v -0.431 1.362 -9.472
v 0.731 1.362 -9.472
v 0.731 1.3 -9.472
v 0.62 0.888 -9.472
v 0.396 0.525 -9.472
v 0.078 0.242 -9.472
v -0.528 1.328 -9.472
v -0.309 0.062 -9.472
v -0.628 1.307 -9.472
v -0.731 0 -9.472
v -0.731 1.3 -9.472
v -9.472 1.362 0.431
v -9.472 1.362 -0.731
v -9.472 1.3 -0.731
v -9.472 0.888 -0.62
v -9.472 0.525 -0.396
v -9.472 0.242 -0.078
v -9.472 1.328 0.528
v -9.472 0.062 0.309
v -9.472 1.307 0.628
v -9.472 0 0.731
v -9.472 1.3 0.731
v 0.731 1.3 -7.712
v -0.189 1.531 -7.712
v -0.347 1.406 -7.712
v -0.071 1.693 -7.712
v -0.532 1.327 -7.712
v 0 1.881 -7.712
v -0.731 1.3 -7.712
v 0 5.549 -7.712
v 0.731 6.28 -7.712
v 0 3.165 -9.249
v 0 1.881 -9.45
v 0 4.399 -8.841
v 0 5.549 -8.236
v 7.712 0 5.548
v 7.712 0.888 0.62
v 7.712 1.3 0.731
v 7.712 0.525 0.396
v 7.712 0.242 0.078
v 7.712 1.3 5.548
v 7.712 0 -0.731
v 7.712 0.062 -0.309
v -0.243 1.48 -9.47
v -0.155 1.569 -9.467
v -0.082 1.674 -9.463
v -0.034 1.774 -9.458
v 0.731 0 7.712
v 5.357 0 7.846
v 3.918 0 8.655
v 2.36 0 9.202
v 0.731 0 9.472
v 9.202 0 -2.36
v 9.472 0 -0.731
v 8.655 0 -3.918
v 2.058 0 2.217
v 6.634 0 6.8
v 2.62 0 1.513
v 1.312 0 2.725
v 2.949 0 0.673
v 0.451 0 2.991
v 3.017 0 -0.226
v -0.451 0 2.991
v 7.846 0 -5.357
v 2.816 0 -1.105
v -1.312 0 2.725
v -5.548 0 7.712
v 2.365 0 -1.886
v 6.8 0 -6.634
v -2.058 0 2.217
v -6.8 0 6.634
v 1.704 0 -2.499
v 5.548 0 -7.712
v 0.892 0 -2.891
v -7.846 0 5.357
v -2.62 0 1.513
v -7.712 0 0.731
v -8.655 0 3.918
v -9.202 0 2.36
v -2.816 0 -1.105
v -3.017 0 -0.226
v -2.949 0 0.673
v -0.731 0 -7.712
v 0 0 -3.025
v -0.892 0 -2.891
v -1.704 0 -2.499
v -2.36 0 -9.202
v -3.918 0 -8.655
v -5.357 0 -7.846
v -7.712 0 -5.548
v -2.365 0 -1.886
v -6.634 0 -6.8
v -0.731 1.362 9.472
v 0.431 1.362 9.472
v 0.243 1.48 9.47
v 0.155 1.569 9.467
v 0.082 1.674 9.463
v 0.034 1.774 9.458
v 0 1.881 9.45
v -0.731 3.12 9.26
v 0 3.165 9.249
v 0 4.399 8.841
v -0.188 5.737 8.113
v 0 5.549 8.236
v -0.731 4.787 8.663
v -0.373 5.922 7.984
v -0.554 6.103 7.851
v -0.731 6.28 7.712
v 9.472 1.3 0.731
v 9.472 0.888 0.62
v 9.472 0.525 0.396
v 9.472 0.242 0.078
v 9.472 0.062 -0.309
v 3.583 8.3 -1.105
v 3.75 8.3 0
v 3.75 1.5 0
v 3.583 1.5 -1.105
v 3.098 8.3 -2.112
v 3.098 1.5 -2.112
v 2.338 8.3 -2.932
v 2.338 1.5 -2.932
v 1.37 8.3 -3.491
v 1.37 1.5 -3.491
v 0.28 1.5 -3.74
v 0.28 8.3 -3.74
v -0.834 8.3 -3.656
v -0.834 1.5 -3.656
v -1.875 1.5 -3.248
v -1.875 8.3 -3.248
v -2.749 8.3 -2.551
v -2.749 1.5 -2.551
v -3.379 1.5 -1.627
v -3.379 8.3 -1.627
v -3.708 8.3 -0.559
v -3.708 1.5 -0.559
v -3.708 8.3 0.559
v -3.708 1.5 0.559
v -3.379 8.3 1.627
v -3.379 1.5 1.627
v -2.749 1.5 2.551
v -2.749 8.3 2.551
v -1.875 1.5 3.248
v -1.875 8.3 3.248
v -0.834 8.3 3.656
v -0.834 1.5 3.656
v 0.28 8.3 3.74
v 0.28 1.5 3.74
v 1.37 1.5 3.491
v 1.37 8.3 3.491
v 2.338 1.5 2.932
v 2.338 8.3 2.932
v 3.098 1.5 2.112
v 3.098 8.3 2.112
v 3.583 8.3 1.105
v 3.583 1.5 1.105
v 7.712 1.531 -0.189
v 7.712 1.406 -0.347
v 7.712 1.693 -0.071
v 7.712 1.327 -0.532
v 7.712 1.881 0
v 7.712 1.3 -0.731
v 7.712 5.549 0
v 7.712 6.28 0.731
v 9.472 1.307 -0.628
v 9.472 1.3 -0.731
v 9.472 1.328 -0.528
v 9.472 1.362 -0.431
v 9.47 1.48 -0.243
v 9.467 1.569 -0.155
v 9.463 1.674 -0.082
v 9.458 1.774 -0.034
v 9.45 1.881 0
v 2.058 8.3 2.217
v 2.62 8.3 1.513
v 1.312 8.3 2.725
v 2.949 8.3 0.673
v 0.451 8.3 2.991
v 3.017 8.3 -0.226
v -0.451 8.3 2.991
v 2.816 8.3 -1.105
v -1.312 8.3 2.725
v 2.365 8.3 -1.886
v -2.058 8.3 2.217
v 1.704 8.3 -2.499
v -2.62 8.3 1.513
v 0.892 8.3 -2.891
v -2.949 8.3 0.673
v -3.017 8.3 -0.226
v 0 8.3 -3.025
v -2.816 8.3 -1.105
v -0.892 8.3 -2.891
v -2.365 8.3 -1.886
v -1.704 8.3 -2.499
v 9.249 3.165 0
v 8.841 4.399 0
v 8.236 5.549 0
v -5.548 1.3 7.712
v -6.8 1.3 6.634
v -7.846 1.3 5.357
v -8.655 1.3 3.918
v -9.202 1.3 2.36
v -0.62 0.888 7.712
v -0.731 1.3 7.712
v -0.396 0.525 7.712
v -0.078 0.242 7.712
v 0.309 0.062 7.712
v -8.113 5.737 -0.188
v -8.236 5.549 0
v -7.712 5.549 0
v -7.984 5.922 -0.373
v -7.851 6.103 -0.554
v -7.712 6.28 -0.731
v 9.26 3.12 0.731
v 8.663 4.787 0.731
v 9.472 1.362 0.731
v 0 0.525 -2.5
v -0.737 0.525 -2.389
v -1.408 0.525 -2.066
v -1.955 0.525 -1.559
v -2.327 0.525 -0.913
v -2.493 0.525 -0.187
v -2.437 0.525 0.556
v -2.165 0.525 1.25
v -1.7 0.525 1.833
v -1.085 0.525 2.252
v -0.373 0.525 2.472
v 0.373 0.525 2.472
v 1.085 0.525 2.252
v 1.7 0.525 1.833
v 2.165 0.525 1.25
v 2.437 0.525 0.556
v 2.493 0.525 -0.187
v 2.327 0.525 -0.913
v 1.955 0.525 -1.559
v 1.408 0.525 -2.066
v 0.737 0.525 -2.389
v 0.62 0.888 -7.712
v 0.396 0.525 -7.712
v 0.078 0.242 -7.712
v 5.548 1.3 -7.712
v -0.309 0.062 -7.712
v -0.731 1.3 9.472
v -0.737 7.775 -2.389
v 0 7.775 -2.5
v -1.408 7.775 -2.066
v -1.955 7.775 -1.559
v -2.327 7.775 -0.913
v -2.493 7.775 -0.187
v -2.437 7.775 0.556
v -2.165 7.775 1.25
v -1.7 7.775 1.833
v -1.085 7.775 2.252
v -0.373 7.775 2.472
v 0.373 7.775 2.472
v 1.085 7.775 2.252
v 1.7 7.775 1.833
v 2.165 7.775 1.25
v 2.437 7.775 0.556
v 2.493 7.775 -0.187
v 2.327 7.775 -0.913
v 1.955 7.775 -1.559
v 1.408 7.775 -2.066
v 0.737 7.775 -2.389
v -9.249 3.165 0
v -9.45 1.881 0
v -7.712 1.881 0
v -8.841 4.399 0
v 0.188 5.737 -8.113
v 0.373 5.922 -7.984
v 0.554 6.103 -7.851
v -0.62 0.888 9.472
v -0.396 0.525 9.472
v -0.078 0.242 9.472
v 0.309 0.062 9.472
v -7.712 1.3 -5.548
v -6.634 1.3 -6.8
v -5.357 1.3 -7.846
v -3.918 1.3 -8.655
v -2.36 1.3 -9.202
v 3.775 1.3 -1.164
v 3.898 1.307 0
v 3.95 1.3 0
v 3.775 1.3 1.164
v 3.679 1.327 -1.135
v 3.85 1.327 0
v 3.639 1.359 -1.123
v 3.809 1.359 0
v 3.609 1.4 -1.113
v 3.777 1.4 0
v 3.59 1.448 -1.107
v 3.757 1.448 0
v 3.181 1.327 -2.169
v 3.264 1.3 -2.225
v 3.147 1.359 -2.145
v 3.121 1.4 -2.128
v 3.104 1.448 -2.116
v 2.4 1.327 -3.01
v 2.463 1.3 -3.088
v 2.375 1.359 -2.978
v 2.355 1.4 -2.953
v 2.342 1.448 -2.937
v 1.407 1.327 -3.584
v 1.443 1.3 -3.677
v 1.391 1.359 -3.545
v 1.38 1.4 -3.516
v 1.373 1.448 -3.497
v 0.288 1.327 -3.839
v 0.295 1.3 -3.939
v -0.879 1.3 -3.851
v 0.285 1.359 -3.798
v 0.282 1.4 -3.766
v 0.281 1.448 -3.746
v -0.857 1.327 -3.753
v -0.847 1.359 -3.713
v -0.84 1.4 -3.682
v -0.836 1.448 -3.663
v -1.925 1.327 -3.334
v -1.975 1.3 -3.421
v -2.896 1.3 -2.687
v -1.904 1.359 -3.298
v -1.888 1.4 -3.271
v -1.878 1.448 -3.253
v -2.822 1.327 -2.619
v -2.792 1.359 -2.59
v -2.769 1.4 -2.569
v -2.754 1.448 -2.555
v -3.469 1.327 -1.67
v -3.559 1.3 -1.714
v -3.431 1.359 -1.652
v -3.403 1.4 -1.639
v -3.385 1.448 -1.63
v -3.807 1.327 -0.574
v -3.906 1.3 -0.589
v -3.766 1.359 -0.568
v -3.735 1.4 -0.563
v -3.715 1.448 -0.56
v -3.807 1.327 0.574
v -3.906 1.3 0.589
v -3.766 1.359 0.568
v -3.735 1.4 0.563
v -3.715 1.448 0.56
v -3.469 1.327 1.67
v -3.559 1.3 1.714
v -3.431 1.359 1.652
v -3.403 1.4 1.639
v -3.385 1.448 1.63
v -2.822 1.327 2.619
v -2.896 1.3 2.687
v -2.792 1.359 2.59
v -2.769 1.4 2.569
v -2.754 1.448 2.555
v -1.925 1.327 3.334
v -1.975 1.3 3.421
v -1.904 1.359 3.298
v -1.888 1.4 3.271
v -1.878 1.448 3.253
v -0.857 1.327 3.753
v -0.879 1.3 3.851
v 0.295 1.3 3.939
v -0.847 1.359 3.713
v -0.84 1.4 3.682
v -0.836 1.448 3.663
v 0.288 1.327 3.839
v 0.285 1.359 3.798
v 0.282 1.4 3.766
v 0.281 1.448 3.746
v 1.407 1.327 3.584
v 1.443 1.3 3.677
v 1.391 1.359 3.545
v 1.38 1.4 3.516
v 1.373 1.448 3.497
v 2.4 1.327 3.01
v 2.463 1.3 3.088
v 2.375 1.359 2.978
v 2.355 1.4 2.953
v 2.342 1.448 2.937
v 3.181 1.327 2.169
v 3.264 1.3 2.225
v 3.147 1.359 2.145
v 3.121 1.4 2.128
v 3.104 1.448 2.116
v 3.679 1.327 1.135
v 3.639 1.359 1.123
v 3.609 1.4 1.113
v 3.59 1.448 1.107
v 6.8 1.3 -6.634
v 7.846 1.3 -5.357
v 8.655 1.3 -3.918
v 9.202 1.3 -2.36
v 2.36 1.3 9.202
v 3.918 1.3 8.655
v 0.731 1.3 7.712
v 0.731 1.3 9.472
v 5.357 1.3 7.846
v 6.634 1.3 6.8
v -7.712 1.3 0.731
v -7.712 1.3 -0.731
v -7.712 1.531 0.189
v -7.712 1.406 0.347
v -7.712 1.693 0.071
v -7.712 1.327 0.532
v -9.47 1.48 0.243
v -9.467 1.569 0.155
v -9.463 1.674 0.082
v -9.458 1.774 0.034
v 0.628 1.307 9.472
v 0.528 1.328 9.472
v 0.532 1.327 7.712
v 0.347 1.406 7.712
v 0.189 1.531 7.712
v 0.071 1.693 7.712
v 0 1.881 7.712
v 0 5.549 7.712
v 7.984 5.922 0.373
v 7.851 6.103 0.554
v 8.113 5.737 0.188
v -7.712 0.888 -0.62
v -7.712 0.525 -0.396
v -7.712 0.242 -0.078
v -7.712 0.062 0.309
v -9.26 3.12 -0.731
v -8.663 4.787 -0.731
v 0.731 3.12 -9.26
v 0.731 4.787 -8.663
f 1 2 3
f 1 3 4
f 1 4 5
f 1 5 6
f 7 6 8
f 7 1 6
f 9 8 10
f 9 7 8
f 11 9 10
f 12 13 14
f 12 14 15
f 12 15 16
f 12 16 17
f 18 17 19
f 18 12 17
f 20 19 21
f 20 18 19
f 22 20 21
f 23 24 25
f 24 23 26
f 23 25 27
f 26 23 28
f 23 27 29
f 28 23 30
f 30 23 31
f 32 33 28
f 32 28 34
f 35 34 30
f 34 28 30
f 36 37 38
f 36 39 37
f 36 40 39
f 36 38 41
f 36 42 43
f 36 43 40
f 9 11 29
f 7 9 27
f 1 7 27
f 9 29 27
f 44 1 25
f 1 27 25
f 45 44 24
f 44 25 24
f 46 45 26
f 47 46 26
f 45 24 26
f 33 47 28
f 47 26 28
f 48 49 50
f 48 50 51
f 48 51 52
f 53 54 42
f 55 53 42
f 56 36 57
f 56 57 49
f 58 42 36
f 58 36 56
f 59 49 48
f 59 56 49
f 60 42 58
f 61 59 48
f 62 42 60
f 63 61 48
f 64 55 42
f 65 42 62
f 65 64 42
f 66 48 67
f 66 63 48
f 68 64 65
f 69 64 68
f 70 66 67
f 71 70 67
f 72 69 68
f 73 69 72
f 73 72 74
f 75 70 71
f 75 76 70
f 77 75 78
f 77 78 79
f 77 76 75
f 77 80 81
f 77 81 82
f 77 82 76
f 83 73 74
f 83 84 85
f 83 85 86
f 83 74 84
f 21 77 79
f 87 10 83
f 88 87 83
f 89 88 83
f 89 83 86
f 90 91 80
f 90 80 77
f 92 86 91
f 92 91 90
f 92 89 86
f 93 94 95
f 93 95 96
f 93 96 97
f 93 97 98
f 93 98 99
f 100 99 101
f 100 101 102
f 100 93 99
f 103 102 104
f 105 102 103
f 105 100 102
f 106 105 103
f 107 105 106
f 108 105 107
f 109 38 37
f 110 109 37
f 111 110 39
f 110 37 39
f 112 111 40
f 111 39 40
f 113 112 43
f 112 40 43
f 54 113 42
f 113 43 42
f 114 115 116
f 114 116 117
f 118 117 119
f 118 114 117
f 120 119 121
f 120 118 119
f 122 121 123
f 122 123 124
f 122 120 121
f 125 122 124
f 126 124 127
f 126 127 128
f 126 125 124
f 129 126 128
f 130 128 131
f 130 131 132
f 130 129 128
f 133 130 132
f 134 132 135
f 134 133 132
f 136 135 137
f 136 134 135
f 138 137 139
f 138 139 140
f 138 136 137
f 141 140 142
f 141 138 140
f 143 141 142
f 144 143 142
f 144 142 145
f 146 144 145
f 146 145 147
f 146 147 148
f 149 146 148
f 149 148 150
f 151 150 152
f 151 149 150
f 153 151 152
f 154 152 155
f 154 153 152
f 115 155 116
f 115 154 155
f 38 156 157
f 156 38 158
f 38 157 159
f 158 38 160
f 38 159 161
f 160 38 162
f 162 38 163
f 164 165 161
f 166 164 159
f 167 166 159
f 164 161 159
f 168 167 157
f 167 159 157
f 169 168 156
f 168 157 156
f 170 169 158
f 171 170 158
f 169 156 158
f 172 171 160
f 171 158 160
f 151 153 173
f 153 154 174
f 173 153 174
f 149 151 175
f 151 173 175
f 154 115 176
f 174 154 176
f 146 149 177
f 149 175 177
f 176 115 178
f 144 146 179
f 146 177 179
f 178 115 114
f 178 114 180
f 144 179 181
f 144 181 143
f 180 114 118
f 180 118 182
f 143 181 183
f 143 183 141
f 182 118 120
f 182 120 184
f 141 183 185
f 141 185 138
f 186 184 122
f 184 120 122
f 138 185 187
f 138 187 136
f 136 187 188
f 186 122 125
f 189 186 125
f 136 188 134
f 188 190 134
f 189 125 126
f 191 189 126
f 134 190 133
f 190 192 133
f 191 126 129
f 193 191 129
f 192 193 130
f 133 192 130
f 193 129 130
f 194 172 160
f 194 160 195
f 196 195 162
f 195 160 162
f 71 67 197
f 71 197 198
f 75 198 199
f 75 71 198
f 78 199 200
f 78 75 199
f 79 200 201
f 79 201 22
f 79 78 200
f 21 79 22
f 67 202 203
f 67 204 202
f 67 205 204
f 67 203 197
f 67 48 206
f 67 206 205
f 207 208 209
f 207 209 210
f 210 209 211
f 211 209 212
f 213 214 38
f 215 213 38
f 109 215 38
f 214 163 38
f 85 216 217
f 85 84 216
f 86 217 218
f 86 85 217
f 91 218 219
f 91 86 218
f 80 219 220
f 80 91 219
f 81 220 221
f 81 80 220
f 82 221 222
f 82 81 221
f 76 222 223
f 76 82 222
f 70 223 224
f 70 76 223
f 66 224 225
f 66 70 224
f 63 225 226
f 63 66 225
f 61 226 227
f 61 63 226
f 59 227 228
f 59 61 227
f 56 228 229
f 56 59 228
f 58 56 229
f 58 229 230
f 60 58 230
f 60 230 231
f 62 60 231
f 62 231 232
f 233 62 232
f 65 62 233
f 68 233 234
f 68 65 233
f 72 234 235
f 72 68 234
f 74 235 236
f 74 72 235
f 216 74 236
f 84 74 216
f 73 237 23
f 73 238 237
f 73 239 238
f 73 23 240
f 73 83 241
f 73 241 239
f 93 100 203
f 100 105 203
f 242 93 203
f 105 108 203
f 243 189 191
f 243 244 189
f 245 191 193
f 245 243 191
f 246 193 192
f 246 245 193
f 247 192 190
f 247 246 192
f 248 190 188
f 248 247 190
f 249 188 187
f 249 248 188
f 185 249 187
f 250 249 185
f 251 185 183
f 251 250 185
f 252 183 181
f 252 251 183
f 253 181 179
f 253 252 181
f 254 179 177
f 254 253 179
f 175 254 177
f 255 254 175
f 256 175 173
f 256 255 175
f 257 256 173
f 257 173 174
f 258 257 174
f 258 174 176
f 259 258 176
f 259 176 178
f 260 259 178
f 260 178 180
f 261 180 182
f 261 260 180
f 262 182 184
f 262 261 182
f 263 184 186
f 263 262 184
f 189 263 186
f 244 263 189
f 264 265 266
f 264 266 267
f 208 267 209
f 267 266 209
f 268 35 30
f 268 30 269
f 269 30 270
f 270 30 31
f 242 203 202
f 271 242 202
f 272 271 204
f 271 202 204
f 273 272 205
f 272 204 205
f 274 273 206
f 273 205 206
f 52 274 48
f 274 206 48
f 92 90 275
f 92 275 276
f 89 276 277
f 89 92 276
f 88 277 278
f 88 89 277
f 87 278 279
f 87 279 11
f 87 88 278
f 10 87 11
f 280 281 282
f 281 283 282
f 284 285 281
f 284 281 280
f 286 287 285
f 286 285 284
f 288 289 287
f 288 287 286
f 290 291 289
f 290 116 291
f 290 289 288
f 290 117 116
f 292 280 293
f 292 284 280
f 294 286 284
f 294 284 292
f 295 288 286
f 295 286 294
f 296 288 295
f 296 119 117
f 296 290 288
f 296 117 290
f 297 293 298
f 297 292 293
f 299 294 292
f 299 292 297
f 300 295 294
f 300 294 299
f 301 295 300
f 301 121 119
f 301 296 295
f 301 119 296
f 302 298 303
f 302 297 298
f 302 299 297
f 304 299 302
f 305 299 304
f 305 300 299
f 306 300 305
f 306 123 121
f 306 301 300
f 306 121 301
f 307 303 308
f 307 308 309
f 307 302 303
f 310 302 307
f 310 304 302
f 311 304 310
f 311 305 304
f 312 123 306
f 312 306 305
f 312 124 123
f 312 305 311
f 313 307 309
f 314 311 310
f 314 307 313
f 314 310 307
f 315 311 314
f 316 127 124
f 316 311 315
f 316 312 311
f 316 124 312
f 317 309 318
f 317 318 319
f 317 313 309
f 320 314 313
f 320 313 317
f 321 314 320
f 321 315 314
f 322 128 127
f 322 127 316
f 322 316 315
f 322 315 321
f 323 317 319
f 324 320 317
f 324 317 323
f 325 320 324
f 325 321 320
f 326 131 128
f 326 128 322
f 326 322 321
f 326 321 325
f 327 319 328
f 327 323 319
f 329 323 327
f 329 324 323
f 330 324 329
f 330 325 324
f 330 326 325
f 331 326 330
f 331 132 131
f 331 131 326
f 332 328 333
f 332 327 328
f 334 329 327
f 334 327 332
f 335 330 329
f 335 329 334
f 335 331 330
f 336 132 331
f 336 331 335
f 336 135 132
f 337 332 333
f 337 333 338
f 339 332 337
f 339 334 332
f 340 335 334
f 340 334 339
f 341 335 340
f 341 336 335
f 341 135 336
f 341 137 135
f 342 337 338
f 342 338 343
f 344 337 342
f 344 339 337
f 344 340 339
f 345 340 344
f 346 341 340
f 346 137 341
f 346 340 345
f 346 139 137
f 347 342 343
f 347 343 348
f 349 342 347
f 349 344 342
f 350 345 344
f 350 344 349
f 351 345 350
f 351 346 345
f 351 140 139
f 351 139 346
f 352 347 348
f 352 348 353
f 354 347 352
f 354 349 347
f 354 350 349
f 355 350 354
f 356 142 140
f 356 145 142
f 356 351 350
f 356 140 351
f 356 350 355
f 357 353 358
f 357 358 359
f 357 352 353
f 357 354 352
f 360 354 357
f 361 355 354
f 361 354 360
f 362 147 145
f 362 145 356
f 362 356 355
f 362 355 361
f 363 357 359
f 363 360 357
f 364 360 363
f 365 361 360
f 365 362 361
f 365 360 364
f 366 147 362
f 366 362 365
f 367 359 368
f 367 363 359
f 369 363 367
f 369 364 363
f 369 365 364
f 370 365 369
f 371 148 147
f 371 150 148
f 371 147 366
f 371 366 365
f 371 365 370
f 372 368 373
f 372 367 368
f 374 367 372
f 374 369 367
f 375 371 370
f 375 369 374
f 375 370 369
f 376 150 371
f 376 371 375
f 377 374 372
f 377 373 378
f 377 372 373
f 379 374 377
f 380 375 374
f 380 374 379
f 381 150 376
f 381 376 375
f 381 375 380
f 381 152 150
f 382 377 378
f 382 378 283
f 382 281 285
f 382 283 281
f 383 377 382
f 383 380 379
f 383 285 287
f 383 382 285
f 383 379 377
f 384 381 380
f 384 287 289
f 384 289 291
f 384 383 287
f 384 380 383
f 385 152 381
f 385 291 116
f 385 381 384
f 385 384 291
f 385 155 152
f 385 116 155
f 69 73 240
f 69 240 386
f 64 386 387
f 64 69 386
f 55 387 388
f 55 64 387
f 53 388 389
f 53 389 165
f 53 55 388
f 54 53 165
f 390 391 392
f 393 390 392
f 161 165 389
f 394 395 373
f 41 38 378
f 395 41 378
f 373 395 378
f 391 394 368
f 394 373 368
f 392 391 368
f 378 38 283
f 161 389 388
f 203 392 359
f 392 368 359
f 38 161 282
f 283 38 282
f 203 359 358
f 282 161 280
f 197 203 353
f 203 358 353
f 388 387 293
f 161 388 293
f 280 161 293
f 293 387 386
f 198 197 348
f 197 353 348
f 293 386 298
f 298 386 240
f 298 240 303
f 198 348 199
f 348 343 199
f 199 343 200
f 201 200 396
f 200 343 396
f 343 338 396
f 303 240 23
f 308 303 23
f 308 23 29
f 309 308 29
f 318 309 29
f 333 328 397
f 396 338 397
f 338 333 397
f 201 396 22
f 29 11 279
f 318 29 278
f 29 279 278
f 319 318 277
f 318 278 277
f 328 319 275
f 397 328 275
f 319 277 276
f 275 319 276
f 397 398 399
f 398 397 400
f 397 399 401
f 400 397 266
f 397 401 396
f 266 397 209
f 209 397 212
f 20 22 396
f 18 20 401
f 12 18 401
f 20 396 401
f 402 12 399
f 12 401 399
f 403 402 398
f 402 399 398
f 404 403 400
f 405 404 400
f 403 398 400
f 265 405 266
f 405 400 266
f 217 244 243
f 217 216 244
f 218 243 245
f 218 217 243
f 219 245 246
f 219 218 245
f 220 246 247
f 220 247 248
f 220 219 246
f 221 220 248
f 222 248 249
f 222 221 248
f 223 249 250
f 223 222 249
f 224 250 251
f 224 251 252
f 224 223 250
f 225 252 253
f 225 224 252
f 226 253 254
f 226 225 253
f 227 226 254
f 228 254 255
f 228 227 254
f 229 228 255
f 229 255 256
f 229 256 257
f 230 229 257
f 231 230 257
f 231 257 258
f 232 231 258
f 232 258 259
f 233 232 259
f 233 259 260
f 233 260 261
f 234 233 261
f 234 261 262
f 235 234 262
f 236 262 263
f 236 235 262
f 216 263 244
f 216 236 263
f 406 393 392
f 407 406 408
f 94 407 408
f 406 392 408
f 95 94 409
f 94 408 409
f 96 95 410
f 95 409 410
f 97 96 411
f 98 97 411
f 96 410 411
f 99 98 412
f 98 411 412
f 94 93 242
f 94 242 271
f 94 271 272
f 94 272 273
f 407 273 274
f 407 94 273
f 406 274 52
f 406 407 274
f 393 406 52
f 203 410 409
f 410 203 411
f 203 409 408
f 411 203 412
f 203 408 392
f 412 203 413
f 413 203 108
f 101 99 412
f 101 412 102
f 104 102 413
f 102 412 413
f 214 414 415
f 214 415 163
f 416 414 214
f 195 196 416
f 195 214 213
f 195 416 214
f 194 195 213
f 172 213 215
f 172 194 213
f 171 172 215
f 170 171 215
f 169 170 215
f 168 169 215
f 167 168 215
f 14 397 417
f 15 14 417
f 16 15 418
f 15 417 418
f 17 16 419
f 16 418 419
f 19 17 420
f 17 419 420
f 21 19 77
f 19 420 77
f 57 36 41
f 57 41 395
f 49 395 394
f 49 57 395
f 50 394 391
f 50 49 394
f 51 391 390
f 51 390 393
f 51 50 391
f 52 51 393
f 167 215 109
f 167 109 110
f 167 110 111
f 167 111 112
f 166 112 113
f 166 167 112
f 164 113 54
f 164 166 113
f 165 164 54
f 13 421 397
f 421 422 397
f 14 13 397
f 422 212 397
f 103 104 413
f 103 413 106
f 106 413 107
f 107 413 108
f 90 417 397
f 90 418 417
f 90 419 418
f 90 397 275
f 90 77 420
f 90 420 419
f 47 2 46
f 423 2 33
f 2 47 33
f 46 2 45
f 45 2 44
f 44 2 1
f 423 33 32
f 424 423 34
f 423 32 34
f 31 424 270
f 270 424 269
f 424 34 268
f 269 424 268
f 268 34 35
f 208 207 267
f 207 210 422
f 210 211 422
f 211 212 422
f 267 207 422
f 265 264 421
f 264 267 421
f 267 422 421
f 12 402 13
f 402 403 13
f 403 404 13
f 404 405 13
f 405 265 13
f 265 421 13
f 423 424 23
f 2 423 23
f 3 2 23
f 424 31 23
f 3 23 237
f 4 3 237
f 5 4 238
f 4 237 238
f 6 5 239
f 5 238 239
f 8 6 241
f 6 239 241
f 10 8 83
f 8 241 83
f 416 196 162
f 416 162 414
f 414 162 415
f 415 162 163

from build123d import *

# Parameters (mm, degrees)
BOSS_EXTRUDE1_DEPTH     = 1.3
BOSS_EXTRUDE2_DEPTH     = 1.76
CIRPATTERN1_COUNT       = 4
CUT_EXTRUDE2_DEPTH      = 15.794267561
CUT_EXTRUDE2_DEPTH_BACK = 15.794267561
CUT_EXTRUDE3_DEPTH      = 15.794267603
CUT_EXTRUDE3_DEPTH_BACK = 15.794267603
SKETCH8_W               = 3.75
SKETCH8_H               = 7
FILLET1_R               = 0.2


with BuildPart() as part:
    # Sketch1 → Boss-Extrude1 (new body)
    with BuildSketch(Plane(origin=(0, 0, 0), x_dir=(1, 0, 0), z_dir=(0, 1, 0))):
        with BuildLine():
            Line((-0.730769231, 7.71160656), (5.548073923, 7.71160656))
            ThreePointArc((5.548073923, 7.71160656), (8.281459084, 4.65482926), (9.47185179, 0.730769231))
            Line((9.47185179, 0.730769231), (7.71160656, 0.730769231))
            Line((7.71160656, 0.730769231), (7.71160656, -5.548073923))
            ThreePointArc((7.71160656, -5.548073923), (4.65482926, -8.281459084), (0.730769231, -9.47185179))
            Line((0.730769231, -9.47185179), (0.730769231, -7.71160656))
            Line((0.730769231, -7.71160656), (-5.548073923, -7.71160656))
            ThreePointArc((-5.548073923, -7.71160656), (-8.281459084, -4.65482926), (-9.47185179, -0.730769231))
            Line((-9.47185179, -0.730769231), (-7.71160656, -0.730769231))
            Line((-7.71160656, -0.730769231), (-7.71160656, 5.548073923))
            ThreePointArc((-7.71160656, 5.548073923), (-4.65482926, 8.281459084), (-0.730769231, 9.47185179))
            Line((-0.730769231, 9.47185179), (-0.730769231, 7.71160656))
        make_face()
    extrude(amount=BOSS_EXTRUDE1_DEPTH)

    # Sketch2 → Boss-Extrude2 (add)
    with BuildSketch(Plane(origin=(0, 0, -7.71160656), x_dir=(-1, 0, 0), z_dir=(0, 0, -1))):
        with BuildLine():
            Line((-0.730769231, 6.28), (-0.730769231, 1.3))
            ThreePointArc((-0.730769231, 1.3), (-0.24725105, 0.372025447), (0.730769231, 0))
            Line((0.730769231, 0), (0.730769231, 1.3))
            ThreePointArc((0.730769231, 1.3), (0.26383811, 1.463095229), (0, 1.881442187))
            Line((0, 1.881442187), (0, 5.549230769))
            Line((0, 5.549230769), (-0.730769231, 6.28))
        make_face()
    boss_extrude2 = extrude(amount=BOSS_EXTRUDE2_DEPTH)

    # CirPattern1: Boss-Extrude2 ×4 about axis
    cirpattern1_axis = Axis((0, 0, 0), (0, 1, 0))
    for i in range(1, CIRPATTERN1_COUNT):
        add(boss_extrude2.rotate(cirpattern1_axis, i * 360 / CIRPATTERN1_COUNT))

    # Sketch6 → Cut-Extrude2 (cut, two sides: drawn at the far end of the back side and taken through both)
    with BuildSketch(Plane(origin=(0, 0, 0), x_dir=(0, 0, -1), z_dir=(1, 0, 0)).offset(-CUT_EXTRUDE2_DEPTH_BACK)):
        with BuildLine():
            Line((-7.71160656, 6.28), (-9.47160656, 6.28))
            Line((-9.47160656, 6.28), (-9.47185179, 1.3))
            ThreePointArc((-9.47185179, 1.3), (-9.018842539, 3.940968727), (-7.71160656, 6.28))
        make_face()
        with BuildLine():
            Line((7.71160656, 6.28), (9.47160656, 6.28))
            Line((9.47160656, 6.28), (9.47185179, 1.3))
            ThreePointArc((9.47185179, 1.3), (9.018842539, 3.940968727), (7.71160656, 6.28))
        make_face()
    extrude(amount=CUT_EXTRUDE2_DEPTH + CUT_EXTRUDE2_DEPTH_BACK, mode=Mode.SUBTRACT)

    # Sketch7 → Cut-Extrude3 (cut, two sides: drawn at the far end of the back side and taken through both)
    with BuildSketch(Plane.XY.offset(-CUT_EXTRUDE3_DEPTH_BACK)):
        with BuildLine():
            Line((-9.47160656, 6.28), (-7.71160656, 6.28))
            ThreePointArc((-7.71160656, 6.28), (-9.018842539, 3.940968727), (-9.47185179, 1.3))
            Line((-9.47185179, 1.3), (-9.47160656, 6.28))
        make_face()
        with BuildLine():
            Line((9.47160656, 6.28), (7.71160656, 6.28))
            ThreePointArc((7.71160656, 6.28), (9.018842539, 3.940968727), (9.47185179, 1.3))
            Line((9.47185179, 1.3), (9.47160656, 6.28))
        make_face()
    extrude(amount=CUT_EXTRUDE3_DEPTH + CUT_EXTRUDE3_DEPTH_BACK, mode=Mode.SUBTRACT)

    # Sketch8 → Revolve1 (revolve)
    with BuildSketch(Plane.XY):
        with Locations((1.875, 4.8)):
            Rectangle(SKETCH8_W, SKETCH8_H)
    revolve(axis=Axis((0, 1.3, 0), (0, 1, 0)))

    # Fillet1
    fillet1_edges = [part.edges().sort_by_distance(p)[0] for p in [
        (-3.75, 1.3, 0),
    ]]
    fillet(fillet1_edges, radius=FILLET1_R)

    # Sketch10 → M6 Tapped Hole1 (revolve, cut)
    with BuildSketch(Plane(origin=(0, 0, 0), x_dir=(0, 0, -1), z_dir=(1, 0, 0))):
        Polygon((0, 0), (0, 8.3), (3.025, 8.3), (2.5, 7.775), (2.5, 0.525), (3.025, 0), align=None)
    revolve(axis=Axis((0, -6.35, 0), (0, 1, 0)), mode=Mode.SUBTRACT)


solid = part.part
